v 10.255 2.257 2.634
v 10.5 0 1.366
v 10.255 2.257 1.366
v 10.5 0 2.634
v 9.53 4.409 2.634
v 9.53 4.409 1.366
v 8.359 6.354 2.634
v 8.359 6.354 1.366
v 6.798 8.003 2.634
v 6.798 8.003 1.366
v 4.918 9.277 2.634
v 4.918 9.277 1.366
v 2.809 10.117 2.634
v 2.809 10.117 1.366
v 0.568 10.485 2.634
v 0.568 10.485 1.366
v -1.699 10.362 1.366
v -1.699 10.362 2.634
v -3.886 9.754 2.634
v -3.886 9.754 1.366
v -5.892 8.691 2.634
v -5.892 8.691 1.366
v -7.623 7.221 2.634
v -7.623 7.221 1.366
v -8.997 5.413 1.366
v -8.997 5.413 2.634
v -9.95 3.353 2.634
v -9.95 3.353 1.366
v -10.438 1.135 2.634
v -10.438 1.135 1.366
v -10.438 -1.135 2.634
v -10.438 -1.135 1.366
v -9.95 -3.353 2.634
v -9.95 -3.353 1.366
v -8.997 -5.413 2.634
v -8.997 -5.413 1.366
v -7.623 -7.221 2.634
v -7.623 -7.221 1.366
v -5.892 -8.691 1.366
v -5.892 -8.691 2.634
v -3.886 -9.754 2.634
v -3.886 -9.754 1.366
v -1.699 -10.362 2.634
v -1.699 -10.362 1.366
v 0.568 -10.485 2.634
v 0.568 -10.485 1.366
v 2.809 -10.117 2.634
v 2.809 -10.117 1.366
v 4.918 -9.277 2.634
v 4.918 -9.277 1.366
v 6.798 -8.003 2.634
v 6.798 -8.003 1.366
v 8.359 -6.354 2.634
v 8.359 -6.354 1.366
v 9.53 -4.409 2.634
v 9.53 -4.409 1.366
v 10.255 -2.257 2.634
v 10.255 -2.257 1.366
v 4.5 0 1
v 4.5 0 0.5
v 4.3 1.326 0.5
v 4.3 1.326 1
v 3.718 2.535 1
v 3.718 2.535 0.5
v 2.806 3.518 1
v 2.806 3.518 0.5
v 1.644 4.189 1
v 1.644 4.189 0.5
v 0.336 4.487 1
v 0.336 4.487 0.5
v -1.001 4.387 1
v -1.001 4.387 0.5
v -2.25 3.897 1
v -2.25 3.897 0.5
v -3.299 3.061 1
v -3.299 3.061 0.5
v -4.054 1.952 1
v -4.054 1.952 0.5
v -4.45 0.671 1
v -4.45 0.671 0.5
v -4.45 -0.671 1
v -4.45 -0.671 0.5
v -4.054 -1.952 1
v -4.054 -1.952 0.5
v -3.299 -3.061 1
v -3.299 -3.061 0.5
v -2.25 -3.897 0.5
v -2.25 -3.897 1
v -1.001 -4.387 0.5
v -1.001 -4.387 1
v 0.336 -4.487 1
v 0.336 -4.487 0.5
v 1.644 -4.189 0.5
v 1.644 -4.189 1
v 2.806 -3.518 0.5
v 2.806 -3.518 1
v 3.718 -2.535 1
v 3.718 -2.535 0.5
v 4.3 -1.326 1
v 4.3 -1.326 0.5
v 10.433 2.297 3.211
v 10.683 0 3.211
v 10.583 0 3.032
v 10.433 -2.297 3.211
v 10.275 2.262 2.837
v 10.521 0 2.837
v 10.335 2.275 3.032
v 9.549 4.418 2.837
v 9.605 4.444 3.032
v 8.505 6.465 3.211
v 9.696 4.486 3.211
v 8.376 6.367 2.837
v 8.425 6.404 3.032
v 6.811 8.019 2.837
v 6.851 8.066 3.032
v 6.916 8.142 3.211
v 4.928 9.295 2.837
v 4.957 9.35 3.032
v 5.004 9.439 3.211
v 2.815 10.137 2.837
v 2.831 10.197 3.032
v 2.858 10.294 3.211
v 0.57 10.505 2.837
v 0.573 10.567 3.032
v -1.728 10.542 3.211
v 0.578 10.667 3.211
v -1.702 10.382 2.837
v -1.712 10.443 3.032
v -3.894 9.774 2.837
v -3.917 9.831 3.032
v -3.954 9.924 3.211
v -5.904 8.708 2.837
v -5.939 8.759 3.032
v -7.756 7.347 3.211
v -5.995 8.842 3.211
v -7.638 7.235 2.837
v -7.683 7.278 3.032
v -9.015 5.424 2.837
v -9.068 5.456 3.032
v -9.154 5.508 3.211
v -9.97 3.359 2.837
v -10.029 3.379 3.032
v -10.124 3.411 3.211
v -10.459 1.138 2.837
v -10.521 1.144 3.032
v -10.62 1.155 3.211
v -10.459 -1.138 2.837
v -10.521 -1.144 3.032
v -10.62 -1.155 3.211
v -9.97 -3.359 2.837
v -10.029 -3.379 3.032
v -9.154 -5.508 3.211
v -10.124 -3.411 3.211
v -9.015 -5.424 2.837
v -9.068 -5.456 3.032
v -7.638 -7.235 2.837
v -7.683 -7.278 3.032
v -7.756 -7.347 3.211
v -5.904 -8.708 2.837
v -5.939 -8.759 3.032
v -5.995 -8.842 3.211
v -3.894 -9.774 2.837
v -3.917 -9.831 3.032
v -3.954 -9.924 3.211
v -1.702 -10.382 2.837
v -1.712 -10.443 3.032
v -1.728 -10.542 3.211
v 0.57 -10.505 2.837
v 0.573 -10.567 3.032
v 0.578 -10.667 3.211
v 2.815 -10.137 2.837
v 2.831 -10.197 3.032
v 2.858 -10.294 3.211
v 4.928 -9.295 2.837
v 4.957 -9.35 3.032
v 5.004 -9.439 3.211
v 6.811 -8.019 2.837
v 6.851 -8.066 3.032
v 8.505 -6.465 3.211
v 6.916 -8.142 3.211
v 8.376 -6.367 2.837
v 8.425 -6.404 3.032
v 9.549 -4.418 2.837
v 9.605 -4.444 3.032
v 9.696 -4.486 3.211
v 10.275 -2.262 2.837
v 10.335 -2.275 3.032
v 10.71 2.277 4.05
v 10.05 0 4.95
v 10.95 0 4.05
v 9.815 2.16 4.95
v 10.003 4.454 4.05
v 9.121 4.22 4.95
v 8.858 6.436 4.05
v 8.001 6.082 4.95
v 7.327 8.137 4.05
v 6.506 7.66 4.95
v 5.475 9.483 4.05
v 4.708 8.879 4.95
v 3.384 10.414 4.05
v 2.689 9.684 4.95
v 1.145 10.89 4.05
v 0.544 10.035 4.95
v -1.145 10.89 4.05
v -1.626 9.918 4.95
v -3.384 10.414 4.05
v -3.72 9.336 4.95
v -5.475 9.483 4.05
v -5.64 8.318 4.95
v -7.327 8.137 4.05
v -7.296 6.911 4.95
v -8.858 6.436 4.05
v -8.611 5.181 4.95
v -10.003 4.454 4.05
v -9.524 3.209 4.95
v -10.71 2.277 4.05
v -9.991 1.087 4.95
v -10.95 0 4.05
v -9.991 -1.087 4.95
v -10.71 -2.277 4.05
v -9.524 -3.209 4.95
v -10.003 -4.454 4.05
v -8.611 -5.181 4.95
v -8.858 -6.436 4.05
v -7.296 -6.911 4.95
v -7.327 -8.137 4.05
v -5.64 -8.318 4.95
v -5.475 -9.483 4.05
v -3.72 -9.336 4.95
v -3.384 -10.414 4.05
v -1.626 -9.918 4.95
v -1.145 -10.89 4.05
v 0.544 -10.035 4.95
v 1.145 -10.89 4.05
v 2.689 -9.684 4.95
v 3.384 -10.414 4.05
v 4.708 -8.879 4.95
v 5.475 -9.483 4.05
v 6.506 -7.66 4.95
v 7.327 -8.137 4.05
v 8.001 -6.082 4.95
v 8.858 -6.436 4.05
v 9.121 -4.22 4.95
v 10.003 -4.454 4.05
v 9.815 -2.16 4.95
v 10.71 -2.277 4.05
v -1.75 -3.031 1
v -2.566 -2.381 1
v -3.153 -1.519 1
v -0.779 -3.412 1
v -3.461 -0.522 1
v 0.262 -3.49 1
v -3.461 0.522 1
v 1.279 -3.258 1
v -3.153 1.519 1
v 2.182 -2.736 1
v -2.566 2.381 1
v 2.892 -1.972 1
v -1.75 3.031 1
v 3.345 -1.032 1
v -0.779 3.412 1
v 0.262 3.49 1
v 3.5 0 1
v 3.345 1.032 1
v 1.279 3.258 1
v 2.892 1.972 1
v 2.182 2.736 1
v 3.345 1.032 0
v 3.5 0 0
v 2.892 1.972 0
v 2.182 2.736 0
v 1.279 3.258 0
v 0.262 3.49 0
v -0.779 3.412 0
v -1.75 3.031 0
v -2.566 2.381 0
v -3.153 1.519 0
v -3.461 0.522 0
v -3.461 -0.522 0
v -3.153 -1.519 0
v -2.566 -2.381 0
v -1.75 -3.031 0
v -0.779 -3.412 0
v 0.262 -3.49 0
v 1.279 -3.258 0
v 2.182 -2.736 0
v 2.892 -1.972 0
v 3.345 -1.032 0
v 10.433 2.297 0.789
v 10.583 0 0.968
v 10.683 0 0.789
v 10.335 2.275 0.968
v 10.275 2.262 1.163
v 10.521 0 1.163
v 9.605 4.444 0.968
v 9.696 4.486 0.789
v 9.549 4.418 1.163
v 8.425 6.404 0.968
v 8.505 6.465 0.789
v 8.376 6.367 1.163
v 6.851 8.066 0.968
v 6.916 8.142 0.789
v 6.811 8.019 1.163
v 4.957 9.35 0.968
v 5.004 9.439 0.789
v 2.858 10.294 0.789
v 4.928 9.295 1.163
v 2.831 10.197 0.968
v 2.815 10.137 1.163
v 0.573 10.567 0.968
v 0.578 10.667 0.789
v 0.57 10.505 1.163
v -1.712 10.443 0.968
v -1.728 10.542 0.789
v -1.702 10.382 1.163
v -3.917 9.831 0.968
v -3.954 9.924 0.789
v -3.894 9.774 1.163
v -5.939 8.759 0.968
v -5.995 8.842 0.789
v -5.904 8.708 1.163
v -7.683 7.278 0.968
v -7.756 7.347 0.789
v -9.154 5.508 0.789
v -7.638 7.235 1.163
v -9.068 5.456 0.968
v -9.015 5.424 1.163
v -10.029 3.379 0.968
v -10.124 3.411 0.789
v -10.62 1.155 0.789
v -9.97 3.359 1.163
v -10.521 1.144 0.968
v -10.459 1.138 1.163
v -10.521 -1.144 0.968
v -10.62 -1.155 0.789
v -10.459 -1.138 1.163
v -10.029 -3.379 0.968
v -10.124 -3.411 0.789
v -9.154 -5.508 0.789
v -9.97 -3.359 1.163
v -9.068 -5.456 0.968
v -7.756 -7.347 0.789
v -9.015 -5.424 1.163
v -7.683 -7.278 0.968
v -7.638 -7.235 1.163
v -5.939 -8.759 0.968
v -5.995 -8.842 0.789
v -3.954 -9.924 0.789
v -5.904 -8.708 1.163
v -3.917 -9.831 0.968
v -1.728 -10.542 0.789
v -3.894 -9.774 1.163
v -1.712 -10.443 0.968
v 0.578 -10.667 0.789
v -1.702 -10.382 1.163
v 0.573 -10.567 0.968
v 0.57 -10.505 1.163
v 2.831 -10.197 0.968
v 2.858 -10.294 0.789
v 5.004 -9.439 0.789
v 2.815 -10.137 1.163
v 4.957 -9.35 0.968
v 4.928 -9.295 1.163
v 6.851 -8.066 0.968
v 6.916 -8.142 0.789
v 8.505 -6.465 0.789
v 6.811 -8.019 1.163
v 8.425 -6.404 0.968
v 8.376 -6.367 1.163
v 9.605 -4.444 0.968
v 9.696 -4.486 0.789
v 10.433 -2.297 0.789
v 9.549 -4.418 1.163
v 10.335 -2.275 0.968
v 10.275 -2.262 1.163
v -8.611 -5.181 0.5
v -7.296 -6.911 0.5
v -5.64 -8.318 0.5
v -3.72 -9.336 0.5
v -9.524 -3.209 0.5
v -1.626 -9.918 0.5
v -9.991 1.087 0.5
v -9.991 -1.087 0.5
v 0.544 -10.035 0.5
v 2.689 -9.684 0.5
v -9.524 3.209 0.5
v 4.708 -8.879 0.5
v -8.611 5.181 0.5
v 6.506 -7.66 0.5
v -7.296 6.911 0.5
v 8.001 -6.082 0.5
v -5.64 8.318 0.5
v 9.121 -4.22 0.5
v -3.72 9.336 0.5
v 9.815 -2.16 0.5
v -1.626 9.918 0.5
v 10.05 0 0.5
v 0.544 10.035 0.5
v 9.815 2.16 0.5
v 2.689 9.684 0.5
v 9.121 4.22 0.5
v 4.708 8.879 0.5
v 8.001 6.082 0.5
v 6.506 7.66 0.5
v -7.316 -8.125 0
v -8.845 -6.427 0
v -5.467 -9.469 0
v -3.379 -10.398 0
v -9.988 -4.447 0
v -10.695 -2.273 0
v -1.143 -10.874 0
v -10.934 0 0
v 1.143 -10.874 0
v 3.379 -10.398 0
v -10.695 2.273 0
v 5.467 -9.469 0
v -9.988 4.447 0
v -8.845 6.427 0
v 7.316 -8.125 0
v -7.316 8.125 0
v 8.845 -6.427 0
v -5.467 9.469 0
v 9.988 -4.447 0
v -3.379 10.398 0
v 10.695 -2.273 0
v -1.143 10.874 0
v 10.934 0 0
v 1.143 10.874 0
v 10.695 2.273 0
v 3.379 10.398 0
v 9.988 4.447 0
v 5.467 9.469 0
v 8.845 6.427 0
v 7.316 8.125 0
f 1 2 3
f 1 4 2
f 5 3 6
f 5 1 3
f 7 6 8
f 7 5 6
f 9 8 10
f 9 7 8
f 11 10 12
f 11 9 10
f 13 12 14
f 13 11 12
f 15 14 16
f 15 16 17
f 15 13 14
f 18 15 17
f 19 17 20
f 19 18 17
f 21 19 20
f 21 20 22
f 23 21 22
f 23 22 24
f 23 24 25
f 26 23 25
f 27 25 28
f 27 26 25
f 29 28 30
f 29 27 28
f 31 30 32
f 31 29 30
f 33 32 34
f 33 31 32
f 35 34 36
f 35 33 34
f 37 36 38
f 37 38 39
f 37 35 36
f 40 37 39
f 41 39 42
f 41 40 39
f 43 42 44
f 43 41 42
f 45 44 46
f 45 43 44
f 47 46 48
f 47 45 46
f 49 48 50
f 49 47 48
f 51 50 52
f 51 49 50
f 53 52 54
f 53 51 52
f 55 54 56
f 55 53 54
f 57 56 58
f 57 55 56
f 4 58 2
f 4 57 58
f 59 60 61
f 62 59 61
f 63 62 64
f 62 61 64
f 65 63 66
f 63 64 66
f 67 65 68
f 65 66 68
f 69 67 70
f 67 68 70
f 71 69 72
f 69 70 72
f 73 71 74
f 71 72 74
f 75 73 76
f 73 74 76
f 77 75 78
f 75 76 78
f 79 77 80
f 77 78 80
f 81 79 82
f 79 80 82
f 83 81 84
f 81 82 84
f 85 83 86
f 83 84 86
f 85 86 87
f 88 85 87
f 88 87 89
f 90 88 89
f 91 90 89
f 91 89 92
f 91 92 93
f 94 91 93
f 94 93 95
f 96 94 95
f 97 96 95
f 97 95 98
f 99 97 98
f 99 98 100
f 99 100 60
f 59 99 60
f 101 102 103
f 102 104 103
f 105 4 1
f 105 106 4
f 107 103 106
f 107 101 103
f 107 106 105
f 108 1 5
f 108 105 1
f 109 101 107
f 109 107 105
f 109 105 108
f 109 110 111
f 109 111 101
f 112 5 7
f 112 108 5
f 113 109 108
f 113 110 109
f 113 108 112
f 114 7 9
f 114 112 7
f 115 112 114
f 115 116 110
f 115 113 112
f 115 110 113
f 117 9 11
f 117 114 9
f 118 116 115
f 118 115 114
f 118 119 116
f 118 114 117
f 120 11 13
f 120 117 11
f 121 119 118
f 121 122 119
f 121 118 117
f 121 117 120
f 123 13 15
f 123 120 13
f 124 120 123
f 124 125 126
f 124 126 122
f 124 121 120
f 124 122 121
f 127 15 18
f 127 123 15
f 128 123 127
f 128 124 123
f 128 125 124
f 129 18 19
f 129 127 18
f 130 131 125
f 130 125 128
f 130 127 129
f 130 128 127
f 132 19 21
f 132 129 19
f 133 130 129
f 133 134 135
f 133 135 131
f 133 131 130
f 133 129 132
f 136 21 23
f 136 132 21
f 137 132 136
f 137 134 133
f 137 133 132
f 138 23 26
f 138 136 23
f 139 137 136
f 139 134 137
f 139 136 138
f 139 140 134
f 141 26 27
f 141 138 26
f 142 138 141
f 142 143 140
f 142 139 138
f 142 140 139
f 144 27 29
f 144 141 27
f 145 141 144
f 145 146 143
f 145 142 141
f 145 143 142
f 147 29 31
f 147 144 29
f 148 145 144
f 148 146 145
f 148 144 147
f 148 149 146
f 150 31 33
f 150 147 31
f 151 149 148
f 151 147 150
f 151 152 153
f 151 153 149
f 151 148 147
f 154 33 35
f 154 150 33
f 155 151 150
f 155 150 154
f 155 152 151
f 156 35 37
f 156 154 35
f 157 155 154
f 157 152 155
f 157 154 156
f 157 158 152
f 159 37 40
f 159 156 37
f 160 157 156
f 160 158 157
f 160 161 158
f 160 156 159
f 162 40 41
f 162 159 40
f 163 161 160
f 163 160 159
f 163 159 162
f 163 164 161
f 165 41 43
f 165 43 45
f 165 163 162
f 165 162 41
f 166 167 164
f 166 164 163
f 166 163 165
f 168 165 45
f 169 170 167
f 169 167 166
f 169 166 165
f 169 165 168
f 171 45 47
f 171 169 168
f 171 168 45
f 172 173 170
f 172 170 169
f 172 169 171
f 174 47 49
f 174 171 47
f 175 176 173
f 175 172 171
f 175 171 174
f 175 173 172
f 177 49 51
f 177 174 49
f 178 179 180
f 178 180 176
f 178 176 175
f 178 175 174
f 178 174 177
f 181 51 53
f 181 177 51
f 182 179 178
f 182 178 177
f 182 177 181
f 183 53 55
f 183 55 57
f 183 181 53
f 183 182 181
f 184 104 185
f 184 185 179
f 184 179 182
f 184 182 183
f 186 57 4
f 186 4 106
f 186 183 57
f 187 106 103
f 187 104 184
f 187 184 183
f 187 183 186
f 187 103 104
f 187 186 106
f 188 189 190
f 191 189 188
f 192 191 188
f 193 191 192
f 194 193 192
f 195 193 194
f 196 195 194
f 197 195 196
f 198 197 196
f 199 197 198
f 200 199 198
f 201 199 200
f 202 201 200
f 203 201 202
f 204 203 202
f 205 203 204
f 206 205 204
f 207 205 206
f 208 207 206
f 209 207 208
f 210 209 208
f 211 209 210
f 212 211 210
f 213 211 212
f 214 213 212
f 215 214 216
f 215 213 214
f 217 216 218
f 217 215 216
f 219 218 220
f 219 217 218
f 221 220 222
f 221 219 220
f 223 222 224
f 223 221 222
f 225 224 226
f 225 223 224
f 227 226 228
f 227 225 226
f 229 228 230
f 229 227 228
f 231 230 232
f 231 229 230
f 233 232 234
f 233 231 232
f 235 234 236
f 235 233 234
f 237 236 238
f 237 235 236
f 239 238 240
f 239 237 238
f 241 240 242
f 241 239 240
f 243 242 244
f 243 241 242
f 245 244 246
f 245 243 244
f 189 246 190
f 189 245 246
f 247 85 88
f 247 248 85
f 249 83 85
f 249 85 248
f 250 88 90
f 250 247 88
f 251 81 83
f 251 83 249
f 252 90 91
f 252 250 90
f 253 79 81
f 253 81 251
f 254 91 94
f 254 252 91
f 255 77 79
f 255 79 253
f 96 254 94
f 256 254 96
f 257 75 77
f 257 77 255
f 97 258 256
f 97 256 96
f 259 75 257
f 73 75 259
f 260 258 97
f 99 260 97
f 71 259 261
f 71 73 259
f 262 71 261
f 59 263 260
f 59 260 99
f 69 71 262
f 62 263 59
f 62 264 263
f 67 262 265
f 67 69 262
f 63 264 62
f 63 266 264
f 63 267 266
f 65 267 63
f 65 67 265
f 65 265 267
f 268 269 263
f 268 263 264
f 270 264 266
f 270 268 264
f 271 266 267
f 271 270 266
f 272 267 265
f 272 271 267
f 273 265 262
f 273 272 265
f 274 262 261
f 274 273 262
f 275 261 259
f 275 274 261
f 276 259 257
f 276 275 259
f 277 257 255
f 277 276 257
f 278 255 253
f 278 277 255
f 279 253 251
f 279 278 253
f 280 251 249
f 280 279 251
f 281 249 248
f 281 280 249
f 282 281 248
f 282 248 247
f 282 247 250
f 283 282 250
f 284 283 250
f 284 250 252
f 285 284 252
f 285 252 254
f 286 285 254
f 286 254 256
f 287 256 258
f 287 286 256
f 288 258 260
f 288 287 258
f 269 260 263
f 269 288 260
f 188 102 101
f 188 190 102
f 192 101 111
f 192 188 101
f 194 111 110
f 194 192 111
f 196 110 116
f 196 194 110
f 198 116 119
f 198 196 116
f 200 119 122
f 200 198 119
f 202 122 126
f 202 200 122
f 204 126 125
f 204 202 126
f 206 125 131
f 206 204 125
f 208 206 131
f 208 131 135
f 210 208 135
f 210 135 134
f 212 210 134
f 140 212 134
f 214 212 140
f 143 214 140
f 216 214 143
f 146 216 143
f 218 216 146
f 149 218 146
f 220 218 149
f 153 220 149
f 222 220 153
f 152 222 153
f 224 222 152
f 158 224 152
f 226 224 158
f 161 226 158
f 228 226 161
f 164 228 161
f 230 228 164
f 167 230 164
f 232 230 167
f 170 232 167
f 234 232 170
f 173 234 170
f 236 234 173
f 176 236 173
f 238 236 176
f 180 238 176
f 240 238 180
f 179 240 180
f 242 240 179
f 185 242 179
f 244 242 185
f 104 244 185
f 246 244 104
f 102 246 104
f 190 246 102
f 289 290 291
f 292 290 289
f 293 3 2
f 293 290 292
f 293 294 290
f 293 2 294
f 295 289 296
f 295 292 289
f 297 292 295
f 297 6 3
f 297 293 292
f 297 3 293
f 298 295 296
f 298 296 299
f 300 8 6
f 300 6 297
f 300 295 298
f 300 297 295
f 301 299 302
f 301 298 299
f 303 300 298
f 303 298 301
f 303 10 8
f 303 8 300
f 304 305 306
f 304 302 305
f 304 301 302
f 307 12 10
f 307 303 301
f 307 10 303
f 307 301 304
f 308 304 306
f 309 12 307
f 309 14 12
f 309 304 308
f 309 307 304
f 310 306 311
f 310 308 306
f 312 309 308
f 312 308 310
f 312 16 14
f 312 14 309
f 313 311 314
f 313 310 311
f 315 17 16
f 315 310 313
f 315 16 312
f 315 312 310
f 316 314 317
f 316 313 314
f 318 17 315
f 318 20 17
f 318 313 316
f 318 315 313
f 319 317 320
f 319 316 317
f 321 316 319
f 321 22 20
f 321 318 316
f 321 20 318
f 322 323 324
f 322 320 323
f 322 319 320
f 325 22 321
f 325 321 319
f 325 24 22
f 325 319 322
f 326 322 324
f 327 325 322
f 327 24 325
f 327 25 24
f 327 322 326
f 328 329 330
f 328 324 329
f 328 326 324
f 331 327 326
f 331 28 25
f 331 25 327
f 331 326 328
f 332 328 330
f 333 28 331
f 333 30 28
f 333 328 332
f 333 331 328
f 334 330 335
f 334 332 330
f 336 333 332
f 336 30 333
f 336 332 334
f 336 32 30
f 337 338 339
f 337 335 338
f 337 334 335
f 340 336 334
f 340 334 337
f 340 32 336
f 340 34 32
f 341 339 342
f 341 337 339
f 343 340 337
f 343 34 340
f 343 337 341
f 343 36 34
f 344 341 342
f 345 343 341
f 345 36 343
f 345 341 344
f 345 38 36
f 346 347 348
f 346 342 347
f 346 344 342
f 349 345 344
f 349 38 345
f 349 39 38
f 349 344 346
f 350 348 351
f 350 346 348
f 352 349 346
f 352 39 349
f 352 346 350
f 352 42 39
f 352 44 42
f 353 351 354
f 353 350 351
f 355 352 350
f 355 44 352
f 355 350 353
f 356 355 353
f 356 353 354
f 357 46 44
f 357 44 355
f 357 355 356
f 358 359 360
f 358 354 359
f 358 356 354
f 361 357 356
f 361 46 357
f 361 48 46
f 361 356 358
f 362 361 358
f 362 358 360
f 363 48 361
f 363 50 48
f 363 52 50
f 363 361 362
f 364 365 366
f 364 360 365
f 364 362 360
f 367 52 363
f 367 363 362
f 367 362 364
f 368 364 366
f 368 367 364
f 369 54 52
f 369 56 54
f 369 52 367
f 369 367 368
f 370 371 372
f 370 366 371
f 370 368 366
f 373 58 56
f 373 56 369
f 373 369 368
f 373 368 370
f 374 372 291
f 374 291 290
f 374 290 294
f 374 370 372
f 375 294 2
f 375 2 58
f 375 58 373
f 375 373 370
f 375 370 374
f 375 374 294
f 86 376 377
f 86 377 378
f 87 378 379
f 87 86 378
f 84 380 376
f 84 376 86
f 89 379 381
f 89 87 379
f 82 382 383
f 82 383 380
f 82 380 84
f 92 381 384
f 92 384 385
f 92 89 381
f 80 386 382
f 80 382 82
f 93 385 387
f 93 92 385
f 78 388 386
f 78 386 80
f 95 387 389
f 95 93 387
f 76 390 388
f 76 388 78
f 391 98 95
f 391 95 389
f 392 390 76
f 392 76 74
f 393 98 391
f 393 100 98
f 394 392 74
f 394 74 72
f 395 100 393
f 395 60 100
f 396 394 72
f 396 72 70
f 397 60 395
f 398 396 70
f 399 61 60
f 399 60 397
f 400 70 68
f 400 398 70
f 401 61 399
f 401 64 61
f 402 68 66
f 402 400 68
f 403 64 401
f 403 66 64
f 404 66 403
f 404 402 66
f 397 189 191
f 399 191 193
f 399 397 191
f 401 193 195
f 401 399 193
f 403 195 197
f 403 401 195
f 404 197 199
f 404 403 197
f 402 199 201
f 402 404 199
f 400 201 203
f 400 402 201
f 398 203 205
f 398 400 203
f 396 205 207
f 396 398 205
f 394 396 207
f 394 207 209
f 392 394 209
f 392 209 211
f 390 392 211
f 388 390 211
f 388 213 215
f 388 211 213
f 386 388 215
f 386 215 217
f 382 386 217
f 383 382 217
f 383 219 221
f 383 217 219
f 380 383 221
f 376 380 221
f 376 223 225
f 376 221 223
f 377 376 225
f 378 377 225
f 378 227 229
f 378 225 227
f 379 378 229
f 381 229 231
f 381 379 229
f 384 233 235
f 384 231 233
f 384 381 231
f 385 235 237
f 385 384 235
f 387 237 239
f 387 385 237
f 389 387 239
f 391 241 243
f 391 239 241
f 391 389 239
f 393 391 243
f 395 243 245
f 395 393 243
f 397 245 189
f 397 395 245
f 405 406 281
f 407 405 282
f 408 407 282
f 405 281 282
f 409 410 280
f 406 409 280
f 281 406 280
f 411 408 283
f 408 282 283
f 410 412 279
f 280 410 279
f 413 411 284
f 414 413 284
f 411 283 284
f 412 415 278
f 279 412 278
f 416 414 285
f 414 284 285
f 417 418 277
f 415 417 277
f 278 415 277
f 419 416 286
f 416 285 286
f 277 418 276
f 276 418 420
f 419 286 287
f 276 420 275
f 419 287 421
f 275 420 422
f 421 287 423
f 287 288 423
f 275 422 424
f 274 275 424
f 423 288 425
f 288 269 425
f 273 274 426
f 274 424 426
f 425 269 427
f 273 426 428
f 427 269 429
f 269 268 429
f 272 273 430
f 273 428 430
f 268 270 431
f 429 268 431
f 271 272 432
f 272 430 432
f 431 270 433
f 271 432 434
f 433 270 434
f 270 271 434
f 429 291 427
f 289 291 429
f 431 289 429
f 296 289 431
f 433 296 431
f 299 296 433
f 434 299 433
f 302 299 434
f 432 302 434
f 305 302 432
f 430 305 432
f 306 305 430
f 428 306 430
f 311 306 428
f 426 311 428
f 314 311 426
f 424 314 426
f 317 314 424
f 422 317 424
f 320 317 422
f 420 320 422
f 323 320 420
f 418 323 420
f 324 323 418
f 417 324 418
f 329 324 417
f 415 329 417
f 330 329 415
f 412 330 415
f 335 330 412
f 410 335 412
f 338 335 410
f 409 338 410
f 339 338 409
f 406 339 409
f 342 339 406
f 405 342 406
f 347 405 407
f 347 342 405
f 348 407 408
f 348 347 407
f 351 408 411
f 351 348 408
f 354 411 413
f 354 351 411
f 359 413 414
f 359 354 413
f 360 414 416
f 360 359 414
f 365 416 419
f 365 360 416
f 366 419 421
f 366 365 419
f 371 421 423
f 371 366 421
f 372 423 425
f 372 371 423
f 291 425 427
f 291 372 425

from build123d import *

# Parameters (mm, degrees)
F0_R          = 11
F0_R_2        = 10.5
F0_R_3        = 10.05
F1_DEPTH      = 5
F4_R          = 11
F4_R_2        = 10.5
F5_DEPTH      = 2
F5_DEPTH_BACK = 1
F0_R_4        = 4.5
F9_DEPTH      = 0.5
F0_R_5        = 3.5
F10_DEPTH     = 1


# Not quite as in the source:
# - a fillet or chamfer that OpenCascade refuses, or shapes differently, is made with other operations: its cross-section is extruded or revolved along the edge and cut away or added


with BuildPart() as f1:
    # F0 (on Top) → F1 (new body)
    with BuildSketch(Plane.XY):
        Circle(F0_R)
        Circle(F0_R_2, mode=Mode.SUBTRACT)
        Circle(F0_R_2)
        Circle(F0_R_3, mode=Mode.SUBTRACT)
    extrude(amount=F1_DEPTH)

    # F4 (on plane+point) → F5 (cut, two sides)
    with BuildSketch(Plane.XY.offset(2.5)) as f5_sk:
        Circle(F4_R)
        Circle(F4_R_2, mode=Mode.SUBTRACT)
    extrude(amount=-F5_DEPTH, mode=Mode.SUBTRACT)
    extrude(f5_sk.sketch, amount=F5_DEPTH_BACK, mode=Mode.SUBTRACT)

    # F6: chamfer of 1 on 1 edges, made by hand

    # F6_s1 → F6_t2 (revolve, cut)
    with BuildSketch(Plane.XZ):
        Polygon((11, 4), (10, 5), (11, 5), align=None)
    revolve(axis=Axis((0, 0, 5), (0, 0, 1)), mode=Mode.SUBTRACT)

    # F7: fillet of radius 1 on 2 edges, made by hand

    # F7_s1 → F7_t2 (revolve)
    with BuildSketch(Plane.XZ):
        with BuildLine():
            ThreePointArc((10.5, 2.6339745962), (10.6339745962, 3.1339745962), (11, 3.5))
            Line((11, 3.5), (10.5, 3.5))
            Line((10.5, 3.5), (10.5, 2.6339745962))
        make_face()
    revolve(axis=Axis((0, 0, 3.5), (0, 0, 1)))

    # F7_s3 → F7_t4 (revolve)
    with BuildSketch(Plane.XZ):
        with BuildLine():
            ThreePointArc((11, 0.5), (10.6339745962, 0.8660254038), (10.5, 1.3660254038))
            Line((10.5, 1.3660254038), (10.5, 0.5))
            Line((10.5, 0.5), (11, 0.5))
        make_face()
    revolve(axis=Axis((0, 0, 0.5), (0, 0, 1)))

    # F8: chamfer of 1 on 2 edges, made by hand

    # F8_s1 → F8_t2 (revolve, cut)
    with BuildSketch(Plane.XZ):
        with BuildLine():
            Line((10.6709126952, 3.1725042869), (11.0121000067, 4.2475531418))
            Line((11.0121000067, 4.2475531418), (11.0321000067, 4.2475531418))
            ThreePointArc((11.0321000067, 4.2475531418), (11.02, 3.8737765709), (11.02, 3.5))
            Line((11.02, 3.5), (11.01, 3.4826794919))
            ThreePointArc((11.01, 3.4826794919), (10.8264226951, 3.3457987418), (10.6872524412, 3.1609711736))
            Line((10.6872524412, 3.1609711736), (10.6709126952, 3.1725042869))
        make_face()
    revolve(axis=Axis((0, 0, 3.5), (0, 0, 1)), mode=Mode.SUBTRACT)

    # F8_s3 → F8_t4 (revolve, cut)
    with BuildSketch(Plane.XZ):
        with BuildLine():
            Line((11.0121000067, -0.2475531418), (10.6709126952, 0.8274957131))
            Line((10.6709126952, 0.8274957131), (10.6872524412, 0.8390288264))
            ThreePointArc((10.6872524412, 0.8390288264), (10.8264226951, 0.6542012582), (11.01, 0.5173205081))
            Line((11.01, 0.5173205081), (11.02, 0.5))
            ThreePointArc((11.02, 0.5), (11.02, 0.1262234291), (11.0321000067, -0.2475531418))
            Line((11.0321000067, -0.2475531418), (11.0121000067, -0.2475531418))
        make_face()
    revolve(axis=Axis((0, 0, 0.5), (0, 0, 1)), mode=Mode.SUBTRACT)

    # F0 (on Top) → F9 (join)
    with BuildSketch(Plane.XY):
        Circle(F0_R_3)
        Circle(F0_R_4, mode=Mode.SUBTRACT)
    extrude(amount=F9_DEPTH)

    # F0 (on Top) → F10 (join)
    with BuildSketch(Plane.XY):
        Circle(F0_R_4)
        Circle(F0_R_5, mode=Mode.SUBTRACT)
    extrude(amount=F10_DEPTH)


solid = f1.part
